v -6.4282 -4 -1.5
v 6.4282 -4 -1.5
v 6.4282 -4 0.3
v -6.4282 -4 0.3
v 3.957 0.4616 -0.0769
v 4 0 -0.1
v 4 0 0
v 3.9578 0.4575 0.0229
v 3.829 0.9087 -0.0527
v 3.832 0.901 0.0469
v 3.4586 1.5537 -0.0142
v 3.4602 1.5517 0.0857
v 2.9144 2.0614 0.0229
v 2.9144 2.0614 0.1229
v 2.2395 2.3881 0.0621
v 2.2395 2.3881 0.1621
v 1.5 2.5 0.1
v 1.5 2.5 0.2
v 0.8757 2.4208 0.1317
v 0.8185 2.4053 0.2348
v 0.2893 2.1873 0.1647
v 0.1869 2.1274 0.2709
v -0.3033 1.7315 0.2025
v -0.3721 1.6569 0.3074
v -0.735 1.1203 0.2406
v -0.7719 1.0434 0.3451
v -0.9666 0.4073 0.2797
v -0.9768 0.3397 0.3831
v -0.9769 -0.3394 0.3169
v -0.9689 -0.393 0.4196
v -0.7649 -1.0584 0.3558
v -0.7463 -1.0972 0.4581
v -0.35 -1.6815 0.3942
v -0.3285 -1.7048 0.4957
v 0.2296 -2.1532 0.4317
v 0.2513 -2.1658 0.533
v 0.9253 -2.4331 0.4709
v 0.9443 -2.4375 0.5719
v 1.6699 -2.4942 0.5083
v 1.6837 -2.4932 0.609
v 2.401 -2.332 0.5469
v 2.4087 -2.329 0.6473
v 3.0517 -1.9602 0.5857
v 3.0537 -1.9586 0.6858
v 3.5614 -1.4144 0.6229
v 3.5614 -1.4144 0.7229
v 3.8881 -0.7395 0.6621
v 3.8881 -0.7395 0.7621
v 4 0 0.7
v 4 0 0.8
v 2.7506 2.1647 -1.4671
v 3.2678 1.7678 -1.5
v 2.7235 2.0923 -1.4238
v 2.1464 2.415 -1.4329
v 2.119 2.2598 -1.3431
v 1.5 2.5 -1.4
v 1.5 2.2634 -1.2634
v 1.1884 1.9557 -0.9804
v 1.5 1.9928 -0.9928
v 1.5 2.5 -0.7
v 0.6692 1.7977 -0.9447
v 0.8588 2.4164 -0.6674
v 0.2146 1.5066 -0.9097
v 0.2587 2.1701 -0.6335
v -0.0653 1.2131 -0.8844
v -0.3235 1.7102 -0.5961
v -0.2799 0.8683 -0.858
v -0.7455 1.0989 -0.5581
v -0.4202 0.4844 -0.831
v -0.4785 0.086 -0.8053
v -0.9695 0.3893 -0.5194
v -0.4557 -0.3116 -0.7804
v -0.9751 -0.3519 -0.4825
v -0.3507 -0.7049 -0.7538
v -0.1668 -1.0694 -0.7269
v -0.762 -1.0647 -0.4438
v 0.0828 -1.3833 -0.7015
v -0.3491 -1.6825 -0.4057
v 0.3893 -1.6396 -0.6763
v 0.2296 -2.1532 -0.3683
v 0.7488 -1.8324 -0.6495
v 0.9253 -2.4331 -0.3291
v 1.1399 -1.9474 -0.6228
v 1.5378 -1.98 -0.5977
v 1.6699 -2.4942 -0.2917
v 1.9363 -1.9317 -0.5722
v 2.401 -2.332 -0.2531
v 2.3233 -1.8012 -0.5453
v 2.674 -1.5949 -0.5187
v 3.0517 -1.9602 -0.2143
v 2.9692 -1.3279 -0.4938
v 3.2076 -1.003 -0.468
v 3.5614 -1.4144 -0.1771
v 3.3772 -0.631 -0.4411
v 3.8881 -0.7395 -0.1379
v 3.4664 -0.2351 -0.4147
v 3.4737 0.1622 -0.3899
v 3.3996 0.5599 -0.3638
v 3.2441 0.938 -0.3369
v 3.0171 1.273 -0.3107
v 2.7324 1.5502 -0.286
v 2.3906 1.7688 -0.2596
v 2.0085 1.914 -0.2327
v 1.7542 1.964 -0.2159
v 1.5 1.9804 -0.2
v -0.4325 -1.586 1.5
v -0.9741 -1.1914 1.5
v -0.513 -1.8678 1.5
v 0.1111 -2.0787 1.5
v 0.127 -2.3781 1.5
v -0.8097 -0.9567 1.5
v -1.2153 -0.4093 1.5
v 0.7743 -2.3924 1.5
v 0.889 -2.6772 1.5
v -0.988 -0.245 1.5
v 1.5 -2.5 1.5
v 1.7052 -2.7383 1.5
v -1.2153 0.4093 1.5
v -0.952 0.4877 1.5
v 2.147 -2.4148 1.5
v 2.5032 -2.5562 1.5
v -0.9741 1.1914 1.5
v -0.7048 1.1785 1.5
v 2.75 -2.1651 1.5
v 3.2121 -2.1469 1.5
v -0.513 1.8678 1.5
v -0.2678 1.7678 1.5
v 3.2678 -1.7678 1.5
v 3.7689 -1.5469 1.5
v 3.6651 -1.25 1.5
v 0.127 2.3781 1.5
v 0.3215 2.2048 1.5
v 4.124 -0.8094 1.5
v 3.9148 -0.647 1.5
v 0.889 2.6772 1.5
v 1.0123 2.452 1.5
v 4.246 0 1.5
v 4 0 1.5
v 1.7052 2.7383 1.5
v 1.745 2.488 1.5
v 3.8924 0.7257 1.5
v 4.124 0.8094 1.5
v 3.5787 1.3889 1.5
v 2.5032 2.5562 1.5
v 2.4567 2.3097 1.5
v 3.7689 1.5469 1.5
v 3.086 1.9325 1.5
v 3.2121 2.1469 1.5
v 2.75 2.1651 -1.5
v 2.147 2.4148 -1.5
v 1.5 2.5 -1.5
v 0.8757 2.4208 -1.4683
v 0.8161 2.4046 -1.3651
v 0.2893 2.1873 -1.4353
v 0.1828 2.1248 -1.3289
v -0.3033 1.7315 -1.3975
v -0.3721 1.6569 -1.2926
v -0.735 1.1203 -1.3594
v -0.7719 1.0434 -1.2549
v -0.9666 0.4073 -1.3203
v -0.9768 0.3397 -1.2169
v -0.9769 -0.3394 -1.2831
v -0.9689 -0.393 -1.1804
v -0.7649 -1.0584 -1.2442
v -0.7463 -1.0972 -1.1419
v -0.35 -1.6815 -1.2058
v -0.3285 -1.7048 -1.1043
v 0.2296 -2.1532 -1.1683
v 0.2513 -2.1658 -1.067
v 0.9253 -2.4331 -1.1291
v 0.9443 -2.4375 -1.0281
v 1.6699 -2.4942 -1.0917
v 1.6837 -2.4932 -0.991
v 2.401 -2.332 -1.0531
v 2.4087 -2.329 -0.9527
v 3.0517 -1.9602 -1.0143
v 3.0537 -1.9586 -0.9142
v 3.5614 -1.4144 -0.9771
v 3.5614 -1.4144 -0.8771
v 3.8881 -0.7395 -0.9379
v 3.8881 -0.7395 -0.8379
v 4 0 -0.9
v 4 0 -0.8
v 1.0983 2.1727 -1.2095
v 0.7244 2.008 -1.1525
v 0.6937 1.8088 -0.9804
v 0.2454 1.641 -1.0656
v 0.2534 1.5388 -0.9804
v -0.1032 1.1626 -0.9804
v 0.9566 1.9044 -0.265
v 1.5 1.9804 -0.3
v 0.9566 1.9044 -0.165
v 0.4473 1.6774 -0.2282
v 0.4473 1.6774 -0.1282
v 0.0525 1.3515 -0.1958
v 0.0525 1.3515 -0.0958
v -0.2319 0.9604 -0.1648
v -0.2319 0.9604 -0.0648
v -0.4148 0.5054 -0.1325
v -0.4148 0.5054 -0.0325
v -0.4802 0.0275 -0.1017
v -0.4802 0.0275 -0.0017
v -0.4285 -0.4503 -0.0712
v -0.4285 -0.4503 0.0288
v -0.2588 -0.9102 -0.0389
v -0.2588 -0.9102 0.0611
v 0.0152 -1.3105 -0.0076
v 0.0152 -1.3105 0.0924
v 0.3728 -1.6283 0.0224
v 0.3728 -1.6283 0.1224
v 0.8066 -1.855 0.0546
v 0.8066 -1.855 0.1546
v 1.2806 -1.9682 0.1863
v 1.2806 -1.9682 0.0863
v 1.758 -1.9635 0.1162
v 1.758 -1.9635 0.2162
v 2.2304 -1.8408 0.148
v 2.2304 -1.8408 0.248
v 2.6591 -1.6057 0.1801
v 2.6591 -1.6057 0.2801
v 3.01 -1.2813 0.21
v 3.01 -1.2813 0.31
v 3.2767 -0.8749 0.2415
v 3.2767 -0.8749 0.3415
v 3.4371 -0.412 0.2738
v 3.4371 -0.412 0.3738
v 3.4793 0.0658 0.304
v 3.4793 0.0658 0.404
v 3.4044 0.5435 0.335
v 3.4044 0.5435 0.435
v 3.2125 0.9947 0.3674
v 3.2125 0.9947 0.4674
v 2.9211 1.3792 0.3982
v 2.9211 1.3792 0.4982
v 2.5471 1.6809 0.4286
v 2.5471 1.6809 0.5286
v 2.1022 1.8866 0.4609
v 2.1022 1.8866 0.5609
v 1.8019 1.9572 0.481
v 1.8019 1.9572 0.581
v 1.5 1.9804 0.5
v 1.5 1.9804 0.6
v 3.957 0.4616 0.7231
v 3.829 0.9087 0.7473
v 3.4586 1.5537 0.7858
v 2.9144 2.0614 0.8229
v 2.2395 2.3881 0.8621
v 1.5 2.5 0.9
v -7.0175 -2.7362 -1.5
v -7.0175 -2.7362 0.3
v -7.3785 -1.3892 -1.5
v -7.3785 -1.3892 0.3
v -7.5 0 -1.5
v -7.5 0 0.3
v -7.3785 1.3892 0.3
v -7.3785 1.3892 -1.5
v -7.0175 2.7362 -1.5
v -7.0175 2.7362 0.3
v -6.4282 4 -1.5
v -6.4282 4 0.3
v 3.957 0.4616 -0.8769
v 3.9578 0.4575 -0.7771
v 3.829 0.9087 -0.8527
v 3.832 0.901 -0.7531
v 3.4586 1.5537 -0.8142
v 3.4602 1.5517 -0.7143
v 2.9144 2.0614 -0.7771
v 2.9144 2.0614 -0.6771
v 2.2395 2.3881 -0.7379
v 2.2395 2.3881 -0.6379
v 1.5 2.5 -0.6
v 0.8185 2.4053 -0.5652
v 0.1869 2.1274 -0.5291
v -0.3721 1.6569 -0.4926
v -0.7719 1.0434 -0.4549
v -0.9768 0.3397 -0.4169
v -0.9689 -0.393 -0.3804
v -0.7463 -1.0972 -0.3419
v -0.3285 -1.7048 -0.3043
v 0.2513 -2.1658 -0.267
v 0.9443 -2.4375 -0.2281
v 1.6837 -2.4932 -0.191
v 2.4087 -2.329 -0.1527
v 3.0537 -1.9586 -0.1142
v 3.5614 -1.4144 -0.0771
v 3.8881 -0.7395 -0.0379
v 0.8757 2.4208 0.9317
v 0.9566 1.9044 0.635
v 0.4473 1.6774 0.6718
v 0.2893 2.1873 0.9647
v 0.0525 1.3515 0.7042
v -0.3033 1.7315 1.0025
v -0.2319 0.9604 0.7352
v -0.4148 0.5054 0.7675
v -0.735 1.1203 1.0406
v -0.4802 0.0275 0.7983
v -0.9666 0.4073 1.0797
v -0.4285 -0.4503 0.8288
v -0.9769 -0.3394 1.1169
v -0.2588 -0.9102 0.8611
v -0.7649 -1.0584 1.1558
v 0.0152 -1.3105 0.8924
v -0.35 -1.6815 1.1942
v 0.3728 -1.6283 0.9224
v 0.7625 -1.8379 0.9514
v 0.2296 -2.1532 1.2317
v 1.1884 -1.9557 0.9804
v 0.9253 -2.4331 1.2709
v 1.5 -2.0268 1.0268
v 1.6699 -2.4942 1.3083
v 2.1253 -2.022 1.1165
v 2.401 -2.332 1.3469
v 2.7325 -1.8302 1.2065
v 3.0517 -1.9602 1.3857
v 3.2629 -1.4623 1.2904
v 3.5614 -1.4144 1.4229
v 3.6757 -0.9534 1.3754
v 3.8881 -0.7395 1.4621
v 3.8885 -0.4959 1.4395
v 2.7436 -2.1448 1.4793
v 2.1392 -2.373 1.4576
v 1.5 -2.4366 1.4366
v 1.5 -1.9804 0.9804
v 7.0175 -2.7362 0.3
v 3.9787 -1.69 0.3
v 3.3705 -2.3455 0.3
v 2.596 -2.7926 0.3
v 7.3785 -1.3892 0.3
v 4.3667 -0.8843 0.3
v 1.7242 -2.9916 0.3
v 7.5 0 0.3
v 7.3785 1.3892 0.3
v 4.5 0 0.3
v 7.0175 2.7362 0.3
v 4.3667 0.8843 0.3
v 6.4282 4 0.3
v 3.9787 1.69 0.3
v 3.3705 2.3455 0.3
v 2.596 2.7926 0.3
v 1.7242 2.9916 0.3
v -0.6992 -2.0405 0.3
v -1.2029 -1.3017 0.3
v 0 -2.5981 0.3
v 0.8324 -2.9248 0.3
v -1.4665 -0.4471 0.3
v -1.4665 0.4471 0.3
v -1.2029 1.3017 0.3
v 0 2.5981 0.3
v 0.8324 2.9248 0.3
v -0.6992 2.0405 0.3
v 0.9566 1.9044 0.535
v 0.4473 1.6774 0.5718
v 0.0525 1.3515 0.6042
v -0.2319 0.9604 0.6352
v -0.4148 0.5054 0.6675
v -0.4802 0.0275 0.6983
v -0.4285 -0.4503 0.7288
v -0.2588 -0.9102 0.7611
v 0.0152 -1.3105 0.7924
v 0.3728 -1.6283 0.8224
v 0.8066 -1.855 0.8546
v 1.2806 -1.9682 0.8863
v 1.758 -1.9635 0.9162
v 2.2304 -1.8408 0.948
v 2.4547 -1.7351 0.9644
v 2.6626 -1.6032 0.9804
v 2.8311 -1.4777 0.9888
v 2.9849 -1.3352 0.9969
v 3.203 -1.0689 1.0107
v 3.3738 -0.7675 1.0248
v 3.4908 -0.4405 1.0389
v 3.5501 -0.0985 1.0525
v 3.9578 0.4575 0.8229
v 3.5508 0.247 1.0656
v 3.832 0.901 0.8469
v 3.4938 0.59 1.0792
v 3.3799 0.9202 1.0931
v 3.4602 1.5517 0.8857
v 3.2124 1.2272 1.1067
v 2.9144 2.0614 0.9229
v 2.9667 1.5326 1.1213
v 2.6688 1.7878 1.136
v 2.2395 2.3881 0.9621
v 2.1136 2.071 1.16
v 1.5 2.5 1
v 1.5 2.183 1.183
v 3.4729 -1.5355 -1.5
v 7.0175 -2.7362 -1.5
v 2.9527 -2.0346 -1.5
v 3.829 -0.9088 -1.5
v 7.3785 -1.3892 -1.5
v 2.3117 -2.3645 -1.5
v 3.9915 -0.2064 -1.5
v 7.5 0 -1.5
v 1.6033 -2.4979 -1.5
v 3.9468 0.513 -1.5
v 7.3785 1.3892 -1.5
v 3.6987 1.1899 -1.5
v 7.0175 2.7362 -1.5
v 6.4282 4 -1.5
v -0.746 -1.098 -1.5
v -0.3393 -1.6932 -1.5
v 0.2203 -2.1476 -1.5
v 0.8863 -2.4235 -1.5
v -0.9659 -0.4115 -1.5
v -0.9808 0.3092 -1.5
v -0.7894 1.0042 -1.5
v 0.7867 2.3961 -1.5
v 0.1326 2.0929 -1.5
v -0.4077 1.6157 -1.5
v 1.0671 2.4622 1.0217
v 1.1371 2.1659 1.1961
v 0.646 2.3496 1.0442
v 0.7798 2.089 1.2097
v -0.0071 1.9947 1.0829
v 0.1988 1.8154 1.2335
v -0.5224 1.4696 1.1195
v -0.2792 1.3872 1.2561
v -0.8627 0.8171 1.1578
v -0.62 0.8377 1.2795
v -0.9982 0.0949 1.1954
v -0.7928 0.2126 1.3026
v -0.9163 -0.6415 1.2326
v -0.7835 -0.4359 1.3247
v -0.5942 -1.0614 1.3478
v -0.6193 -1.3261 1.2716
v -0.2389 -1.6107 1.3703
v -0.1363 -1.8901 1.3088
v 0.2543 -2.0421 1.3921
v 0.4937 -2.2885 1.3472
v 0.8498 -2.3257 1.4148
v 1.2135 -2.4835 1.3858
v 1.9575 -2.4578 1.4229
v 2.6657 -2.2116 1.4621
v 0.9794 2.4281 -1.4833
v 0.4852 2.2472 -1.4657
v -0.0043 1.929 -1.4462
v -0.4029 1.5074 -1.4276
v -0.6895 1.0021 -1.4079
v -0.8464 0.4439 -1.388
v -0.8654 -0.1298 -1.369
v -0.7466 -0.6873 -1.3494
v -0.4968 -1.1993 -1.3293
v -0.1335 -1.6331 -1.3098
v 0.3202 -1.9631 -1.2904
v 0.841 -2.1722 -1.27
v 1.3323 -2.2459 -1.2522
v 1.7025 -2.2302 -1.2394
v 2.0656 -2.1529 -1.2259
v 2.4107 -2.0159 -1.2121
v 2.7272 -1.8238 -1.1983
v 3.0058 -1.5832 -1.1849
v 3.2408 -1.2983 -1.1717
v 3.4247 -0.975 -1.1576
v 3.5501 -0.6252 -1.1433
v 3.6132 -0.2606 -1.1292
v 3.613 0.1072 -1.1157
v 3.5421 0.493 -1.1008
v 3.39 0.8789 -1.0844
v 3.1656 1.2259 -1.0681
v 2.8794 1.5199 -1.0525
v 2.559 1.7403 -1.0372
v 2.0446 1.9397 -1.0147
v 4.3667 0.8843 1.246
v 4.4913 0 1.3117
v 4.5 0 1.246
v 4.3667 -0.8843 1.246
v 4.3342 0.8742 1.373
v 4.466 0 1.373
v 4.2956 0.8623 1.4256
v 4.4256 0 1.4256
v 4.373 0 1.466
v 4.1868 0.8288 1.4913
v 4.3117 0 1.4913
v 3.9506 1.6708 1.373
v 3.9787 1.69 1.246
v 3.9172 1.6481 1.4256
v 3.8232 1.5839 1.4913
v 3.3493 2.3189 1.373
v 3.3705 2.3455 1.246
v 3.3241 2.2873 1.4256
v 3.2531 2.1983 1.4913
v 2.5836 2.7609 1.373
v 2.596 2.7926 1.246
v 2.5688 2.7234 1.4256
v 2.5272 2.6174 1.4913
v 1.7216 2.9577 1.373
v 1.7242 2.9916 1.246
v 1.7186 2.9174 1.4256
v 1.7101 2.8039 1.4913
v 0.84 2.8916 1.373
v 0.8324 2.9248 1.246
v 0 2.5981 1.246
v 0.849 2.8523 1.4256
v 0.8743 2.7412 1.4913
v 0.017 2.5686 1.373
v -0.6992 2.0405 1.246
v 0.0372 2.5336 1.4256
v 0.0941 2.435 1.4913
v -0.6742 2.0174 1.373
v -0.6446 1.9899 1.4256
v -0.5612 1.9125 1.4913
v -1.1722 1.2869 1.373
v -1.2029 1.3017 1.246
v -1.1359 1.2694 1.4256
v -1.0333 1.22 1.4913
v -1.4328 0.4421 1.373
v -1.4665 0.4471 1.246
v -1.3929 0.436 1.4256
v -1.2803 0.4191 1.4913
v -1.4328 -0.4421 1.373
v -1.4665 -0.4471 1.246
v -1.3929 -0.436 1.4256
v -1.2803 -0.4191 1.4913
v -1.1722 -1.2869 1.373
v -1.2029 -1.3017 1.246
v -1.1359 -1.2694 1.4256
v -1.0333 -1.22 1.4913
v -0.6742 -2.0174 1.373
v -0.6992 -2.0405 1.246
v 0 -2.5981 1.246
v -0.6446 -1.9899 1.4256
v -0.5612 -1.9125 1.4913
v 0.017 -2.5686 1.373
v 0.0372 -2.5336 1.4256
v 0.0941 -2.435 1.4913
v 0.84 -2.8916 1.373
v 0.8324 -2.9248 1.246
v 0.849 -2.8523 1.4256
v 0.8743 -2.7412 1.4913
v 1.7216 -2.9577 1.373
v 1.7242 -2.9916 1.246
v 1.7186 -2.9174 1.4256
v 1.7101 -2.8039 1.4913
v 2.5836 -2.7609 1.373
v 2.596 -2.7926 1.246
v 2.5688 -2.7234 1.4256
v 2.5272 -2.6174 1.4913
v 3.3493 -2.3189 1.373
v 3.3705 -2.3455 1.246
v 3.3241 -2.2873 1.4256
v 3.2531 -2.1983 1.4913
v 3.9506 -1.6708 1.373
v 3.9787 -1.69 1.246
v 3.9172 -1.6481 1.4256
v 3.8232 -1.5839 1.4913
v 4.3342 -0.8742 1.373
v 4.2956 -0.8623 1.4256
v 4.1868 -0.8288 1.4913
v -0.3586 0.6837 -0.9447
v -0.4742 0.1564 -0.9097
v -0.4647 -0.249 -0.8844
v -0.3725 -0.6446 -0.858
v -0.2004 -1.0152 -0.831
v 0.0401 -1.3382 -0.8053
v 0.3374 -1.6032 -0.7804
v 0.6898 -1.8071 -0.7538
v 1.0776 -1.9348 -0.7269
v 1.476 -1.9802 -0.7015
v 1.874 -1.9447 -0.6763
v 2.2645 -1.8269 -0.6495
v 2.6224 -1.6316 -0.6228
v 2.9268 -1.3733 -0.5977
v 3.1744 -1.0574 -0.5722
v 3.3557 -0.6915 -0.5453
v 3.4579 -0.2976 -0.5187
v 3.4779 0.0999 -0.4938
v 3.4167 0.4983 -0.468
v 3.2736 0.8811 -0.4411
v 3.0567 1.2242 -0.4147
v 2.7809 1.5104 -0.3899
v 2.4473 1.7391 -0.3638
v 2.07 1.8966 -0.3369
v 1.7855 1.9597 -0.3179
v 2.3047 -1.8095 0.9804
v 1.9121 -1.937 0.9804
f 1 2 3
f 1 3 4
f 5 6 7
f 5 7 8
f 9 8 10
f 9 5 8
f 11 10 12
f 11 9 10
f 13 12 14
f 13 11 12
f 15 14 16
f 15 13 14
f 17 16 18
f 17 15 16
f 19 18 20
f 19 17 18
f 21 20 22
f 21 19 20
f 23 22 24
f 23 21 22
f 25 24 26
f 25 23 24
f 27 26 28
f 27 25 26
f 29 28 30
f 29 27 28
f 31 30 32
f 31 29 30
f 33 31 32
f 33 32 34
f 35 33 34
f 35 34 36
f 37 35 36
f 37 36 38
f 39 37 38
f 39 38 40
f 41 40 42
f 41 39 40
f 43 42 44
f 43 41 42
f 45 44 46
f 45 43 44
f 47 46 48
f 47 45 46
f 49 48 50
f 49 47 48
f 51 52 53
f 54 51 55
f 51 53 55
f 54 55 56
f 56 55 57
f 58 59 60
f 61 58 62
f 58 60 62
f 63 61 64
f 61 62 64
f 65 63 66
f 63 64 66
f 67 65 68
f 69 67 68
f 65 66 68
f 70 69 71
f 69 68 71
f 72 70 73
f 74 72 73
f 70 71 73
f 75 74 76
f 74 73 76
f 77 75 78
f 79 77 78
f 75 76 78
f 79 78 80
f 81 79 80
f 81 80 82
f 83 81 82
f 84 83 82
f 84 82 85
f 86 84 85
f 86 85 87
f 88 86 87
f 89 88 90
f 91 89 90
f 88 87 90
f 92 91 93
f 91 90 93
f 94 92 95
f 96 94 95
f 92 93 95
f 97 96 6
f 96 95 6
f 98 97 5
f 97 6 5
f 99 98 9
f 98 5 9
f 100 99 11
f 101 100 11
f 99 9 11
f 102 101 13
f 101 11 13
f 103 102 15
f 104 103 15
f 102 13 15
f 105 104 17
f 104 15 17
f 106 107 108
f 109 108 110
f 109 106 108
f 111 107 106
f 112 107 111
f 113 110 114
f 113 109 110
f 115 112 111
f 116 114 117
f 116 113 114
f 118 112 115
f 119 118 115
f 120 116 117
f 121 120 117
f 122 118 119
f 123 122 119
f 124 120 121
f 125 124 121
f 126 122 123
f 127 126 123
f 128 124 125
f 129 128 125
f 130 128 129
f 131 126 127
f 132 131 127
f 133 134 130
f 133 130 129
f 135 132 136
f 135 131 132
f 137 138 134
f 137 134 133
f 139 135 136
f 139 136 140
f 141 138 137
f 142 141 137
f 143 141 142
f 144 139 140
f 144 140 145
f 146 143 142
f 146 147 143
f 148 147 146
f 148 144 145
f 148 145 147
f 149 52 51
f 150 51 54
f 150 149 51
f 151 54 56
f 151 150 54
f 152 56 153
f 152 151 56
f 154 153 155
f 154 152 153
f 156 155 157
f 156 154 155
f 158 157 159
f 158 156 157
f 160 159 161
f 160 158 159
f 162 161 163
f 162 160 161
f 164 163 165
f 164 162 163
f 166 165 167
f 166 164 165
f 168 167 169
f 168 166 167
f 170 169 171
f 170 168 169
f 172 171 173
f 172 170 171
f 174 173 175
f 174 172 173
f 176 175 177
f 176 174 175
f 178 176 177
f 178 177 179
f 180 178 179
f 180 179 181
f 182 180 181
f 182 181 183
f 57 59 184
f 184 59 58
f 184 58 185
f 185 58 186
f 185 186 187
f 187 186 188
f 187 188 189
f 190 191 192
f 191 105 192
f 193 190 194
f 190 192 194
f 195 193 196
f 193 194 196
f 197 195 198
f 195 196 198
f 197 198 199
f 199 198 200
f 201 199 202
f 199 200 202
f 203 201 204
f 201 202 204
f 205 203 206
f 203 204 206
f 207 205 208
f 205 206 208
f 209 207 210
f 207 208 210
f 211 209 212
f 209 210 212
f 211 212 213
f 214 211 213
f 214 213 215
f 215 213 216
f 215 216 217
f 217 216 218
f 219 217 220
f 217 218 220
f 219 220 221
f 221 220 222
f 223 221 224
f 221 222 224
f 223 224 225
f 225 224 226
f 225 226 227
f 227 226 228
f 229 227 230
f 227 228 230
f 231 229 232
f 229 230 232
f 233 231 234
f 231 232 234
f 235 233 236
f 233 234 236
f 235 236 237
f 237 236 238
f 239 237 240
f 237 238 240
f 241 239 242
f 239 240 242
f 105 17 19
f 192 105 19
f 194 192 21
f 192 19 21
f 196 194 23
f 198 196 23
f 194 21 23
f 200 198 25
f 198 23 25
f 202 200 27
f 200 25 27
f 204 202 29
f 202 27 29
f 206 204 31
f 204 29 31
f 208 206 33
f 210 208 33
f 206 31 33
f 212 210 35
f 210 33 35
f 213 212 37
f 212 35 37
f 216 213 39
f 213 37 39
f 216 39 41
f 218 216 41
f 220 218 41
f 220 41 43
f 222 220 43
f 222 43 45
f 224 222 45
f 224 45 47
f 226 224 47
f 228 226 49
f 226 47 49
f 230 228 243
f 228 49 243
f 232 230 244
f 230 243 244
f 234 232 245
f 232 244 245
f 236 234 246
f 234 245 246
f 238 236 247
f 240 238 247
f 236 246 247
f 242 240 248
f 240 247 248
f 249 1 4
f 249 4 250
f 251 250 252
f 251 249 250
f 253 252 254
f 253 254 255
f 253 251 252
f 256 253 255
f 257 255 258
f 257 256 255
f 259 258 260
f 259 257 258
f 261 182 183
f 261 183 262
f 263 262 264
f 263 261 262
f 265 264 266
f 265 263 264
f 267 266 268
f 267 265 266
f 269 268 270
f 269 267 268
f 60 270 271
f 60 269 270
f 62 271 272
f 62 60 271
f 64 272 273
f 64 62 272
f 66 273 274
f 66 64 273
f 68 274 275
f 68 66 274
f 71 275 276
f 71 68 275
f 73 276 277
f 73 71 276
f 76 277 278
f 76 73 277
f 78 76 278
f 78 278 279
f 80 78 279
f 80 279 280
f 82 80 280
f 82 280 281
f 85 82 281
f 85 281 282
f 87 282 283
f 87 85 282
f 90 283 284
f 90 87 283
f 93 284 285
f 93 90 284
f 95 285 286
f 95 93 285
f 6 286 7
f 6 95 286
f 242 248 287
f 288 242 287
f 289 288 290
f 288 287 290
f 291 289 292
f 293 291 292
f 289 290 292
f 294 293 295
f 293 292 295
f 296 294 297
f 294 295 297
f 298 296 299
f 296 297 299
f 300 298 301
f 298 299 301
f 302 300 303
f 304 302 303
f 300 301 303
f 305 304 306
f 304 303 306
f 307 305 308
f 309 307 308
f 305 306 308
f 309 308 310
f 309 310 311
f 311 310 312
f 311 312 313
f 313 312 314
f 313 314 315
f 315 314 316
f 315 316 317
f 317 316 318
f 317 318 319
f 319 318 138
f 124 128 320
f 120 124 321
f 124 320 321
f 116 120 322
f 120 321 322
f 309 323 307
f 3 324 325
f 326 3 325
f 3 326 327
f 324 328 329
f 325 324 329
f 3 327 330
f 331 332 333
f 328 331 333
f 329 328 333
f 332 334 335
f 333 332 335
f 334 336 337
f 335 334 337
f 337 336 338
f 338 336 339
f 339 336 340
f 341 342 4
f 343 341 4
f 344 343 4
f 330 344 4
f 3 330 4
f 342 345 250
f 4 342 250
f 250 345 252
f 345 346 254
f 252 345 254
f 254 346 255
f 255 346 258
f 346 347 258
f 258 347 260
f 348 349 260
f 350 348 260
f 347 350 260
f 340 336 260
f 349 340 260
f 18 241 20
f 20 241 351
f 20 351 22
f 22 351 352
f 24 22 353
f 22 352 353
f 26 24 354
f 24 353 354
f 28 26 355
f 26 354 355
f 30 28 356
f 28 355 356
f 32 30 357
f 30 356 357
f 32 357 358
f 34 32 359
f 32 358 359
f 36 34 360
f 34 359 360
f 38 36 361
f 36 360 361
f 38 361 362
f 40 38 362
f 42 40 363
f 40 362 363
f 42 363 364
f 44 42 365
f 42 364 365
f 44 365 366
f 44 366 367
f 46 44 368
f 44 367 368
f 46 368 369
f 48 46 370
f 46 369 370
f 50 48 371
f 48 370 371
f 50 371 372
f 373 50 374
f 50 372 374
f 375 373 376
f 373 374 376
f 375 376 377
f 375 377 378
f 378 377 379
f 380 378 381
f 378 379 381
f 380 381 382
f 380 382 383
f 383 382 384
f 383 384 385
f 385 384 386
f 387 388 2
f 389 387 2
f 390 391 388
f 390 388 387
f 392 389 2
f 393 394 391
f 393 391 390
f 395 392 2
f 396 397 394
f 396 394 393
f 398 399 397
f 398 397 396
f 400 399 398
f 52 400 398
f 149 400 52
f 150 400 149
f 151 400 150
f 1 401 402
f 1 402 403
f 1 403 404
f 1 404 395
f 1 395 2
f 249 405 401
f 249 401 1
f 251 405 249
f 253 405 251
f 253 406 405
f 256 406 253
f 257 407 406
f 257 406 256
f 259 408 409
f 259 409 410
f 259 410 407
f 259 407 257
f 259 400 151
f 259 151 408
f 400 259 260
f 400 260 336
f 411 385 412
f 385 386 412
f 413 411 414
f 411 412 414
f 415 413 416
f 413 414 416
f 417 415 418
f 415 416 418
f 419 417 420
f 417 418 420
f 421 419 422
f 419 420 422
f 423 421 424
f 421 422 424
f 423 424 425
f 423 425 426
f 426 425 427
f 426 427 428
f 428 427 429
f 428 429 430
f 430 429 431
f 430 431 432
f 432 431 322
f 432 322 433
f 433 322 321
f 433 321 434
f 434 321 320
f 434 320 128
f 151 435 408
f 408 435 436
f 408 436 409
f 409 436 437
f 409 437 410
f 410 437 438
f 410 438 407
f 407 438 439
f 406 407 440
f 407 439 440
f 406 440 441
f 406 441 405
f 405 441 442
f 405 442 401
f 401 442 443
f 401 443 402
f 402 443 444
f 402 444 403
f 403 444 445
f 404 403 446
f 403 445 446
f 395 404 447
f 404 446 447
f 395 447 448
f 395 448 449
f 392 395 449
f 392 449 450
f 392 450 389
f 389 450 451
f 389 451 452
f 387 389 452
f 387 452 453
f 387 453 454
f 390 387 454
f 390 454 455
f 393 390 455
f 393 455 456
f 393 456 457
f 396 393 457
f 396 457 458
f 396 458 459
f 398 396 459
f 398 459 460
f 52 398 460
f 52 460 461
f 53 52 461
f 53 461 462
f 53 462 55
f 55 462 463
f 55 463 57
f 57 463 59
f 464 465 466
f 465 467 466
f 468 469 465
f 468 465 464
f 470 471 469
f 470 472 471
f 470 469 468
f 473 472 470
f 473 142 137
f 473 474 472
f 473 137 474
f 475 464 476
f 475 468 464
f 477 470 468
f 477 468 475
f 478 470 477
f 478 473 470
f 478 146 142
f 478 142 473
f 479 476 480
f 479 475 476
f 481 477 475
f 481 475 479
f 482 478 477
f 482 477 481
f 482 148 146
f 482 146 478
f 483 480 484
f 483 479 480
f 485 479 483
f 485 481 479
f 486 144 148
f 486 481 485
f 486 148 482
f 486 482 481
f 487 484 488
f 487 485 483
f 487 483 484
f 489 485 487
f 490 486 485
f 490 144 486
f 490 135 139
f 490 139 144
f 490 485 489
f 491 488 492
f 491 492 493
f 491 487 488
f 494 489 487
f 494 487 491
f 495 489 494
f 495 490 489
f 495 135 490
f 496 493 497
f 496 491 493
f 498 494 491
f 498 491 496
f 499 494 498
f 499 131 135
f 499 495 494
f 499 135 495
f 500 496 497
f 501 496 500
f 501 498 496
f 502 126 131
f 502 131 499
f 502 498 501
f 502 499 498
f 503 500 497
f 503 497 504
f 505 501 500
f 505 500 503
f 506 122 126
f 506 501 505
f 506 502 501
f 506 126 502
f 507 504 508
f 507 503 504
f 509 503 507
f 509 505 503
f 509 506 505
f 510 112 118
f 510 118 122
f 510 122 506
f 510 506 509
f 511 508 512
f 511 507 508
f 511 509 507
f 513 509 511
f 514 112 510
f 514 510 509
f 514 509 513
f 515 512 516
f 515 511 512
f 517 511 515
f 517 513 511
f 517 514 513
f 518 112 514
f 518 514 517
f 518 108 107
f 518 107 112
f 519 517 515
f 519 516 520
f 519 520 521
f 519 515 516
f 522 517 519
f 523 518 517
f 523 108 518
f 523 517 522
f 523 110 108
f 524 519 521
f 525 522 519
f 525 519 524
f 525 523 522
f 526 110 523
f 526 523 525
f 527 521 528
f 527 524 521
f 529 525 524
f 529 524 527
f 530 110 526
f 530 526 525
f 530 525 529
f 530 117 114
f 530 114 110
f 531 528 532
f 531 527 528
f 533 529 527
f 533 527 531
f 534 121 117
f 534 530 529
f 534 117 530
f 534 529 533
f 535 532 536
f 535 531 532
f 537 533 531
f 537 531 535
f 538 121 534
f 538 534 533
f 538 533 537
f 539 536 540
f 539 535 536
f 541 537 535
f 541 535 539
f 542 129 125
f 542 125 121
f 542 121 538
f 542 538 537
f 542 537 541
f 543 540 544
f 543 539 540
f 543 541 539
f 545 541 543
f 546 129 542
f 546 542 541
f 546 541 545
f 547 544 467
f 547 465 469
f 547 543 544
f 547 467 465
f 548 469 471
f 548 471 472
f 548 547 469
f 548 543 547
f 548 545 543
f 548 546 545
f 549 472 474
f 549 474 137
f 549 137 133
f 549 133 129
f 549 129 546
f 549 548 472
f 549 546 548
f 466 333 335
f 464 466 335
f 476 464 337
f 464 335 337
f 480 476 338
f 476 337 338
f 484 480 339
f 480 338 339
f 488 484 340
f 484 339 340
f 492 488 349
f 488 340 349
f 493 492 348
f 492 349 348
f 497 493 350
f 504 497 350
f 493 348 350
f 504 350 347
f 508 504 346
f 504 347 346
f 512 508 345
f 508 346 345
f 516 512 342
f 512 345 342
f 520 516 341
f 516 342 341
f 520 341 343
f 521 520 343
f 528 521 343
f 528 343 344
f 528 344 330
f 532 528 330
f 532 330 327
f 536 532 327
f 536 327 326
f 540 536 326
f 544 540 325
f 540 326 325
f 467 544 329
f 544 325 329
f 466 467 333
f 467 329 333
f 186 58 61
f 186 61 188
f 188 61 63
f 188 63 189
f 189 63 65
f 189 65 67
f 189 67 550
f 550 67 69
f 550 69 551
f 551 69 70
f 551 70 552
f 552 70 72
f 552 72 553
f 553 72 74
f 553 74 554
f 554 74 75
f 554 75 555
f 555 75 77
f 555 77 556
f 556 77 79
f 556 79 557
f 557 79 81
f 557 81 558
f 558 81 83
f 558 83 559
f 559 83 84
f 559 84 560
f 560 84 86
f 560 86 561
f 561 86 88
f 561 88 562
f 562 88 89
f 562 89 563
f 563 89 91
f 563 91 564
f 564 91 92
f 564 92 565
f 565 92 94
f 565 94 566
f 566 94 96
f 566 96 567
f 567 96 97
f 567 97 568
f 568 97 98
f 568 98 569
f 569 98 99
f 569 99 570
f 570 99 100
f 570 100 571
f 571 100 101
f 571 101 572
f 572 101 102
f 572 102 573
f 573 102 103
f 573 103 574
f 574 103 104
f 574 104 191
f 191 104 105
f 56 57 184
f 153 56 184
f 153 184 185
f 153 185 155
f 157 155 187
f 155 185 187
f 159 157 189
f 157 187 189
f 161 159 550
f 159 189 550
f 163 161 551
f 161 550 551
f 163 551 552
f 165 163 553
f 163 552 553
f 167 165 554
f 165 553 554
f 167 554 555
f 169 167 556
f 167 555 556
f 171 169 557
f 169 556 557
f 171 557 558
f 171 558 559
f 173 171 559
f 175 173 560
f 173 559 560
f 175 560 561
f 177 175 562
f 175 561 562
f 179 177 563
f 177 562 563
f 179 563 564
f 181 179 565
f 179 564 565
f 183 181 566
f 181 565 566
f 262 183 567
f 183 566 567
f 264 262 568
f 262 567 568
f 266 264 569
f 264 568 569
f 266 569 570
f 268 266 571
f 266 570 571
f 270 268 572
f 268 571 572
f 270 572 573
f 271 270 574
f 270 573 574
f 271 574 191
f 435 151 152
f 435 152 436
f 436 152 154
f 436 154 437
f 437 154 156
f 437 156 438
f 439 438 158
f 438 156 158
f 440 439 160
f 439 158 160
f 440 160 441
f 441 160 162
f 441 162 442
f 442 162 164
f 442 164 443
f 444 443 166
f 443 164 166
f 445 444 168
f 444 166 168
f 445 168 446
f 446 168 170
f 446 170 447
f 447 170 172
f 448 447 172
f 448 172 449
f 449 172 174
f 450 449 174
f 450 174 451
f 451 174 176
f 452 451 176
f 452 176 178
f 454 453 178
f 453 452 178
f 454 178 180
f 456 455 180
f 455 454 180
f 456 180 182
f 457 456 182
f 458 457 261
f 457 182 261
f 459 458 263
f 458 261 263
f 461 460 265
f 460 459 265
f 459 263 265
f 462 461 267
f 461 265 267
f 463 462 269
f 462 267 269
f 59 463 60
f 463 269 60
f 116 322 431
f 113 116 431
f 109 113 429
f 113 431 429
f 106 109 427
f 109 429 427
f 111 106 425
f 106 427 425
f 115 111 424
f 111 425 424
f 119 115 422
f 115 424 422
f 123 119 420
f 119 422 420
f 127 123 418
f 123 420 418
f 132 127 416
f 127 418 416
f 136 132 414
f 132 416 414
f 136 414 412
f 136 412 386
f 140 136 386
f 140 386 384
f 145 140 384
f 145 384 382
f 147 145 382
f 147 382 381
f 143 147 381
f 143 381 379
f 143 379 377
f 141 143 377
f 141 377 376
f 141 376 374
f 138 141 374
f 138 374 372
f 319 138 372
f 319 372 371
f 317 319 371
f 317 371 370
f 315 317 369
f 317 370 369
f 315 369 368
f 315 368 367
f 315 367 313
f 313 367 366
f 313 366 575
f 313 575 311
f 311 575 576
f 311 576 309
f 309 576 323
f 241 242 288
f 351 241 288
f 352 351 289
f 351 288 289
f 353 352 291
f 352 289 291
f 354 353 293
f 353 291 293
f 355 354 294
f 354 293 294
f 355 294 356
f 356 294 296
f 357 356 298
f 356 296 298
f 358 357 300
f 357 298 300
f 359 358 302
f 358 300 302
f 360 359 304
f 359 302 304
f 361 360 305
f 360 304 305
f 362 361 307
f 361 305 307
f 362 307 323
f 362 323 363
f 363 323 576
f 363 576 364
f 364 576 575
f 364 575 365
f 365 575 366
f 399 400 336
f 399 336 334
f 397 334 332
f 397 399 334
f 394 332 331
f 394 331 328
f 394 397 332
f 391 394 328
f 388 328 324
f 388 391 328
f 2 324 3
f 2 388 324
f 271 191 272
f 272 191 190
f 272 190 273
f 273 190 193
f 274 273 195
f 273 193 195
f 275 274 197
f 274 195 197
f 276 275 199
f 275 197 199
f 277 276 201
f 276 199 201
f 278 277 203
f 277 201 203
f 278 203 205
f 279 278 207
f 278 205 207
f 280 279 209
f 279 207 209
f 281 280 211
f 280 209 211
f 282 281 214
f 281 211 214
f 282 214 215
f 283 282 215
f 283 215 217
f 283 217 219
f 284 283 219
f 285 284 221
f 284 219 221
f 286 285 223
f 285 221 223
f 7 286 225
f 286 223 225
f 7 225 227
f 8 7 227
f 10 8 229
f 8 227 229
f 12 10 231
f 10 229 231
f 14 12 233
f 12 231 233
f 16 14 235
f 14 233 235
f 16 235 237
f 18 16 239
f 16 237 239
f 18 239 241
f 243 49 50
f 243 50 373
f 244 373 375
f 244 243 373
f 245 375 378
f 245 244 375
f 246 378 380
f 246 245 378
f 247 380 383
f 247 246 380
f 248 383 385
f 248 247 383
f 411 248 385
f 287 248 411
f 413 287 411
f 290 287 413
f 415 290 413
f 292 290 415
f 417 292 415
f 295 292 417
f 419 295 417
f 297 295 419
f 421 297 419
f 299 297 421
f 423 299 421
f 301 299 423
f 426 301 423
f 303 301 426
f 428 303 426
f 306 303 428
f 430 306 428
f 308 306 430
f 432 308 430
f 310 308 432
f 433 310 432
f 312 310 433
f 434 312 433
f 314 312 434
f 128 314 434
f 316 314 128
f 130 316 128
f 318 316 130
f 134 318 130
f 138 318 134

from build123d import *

# Parameters (mm, degrees)
BOSS_EXTRUDE1_START     = -1.5
BOSS_EXTRUDE1_DEPTH     = 1.8
SKETCH8_R               = 3
SKETCH8_R_2             = 2.5
BOSS_EXTRUDE2_DEPTH     = 1.2
CUT_EXTRUDE1_DEPTH      = 9.631338251
CUT_EXTRUDE1_DEPTH_BACK = 9.631338251
SKETCH9_R               = 2.5
FILLET1_R               = 0.254
SWEEP1_PITCH            = 0.8
SPLIT1_START            = -2.7460001
SPLIT1_OUTLINE_W        = 9
SPLIT1_OUTLINE_H        = 2.5
SPLIT1_DEPTH            = 5.4920002


with BuildPart() as part:
    # Sketch7 → Boss-Extrude1 (new body)
    with BuildSketch(Plane.XY.offset(BOSS_EXTRUDE1_START)):
        with BuildLine():
            Line((-6.42820323, 4), (6.42820323, 4))
            ThreePointArc((6.42820323, 4), (7.5, 0), (6.42820323, -4))
            Line((6.42820323, -4), (-6.42820323, -4))
            ThreePointArc((-6.42820323, -4), (-7.5, 0), (-6.42820323, 4))
        make_face()
    extrude(amount=BOSS_EXTRUDE1_DEPTH)

    # Sketch8 → Boss-Extrude2 (add)
    with BuildSketch(Plane.XY.offset(0.3)):
        with Locations((1.5, 0)):
            Circle(SKETCH8_R)
        with Locations((1.5, 0)):
            Circle(SKETCH8_R_2, mode=Mode.SUBTRACT)
    extrude(amount=BOSS_EXTRUDE2_DEPTH)

    # Sketch9 → Cut-Extrude1 (cut, two sides: drawn at the far end of the back side and taken through both)
    with BuildSketch(Plane.XY.offset(-CUT_EXTRUDE1_DEPTH_BACK)):
        with Locations((1.5, 0)):
            Circle(SKETCH9_R)
    extrude(amount=CUT_EXTRUDE1_DEPTH + CUT_EXTRUDE1_DEPTH_BACK, mode=Mode.SUBTRACT)

    # Fillet1
    fillet1_edges = [part.edges().sort_by_distance(p)[0] for p in [
        (-1.5, 0, 1.5),
    ]]
    fillet(fillet1_edges, radius=FILLET1_R)

    # Sweep1: arcs per turn and ends read off the stored shape
    # Sweep1: the profile of Sketch3 screwed along a right-hand helix through 4.75 turns, 8 arcs to a turn; built about Z, then put on its axis
    sweep1_z = Axis((0, 0, 0), (0, 0, 1))
    sweep1_corners = [(2.54330127, 0, 0.025), (2.54330127, 0, -0.725), (1.980384758, 0, -0.4), (1.980384758, 0, -0.3)]
    with BuildLine(mode=Mode.PRIVATE) as sweep1_profile:
        Line(sweep1_corners[0], sweep1_corners[1])
        Line(sweep1_corners[1], sweep1_corners[2])
        Line(sweep1_corners[2], sweep1_corners[3])
        Line(sweep1_corners[3], sweep1_corners[0])
    sweep1_cap = Face(sweep1_profile.wire())
    sweep1_turn_angles = [0, 22.5, 45, 67.5, 90, 112.5, 135, 157.5, 180, 202.5, 225, 247.5, 270, 292.5, 315, 337.5, 360]
    sweep1_turn_weights = [1, 0.9238795325112867, 1, 0.9238795325112867, 1, 0.9238795325112867, 1, 0.9238795325112867, 1, 0.9238795325112867, 1, 0.9238795325112867, 1, 0.9238795325112867, 1, 0.9238795325112867, 1]
    sweep1_turn_rails = [Edge.make_bspline([Vector(p[0], p[1], 0).rotate(sweep1_z, sweep1_turn_angles[k]) / sweep1_turn_weights[k] + Vector(0, 0, p[2] + SWEEP1_PITCH * sweep1_turn_angles[k] / 360) for k in range(17)], [0, 0, 0, 1, 1, 2, 2, 3, 3, 4, 4, 5, 5, 6, 6, 7, 7, 8, 8, 8], 2, sweep1_turn_weights) for p in sweep1_corners]
    sweep1_turn_sides = [Face.make_surface_from_curves(sweep1_turn_rails[p[0]], sweep1_turn_rails[p[1]]) for p in [(0, 1), (1, 2), (2, 3), (3, 0)]]
    sweep1_last_angles = [1440, 1462.5, 1485, 1507.5, 1530, 1552.5, 1575, 1597.5, 1620, 1642.5, 1665, 1687.5, 1710]
    sweep1_last_weights = [1, 0.9238795325112867, 1, 0.9238795325112867, 1, 0.9238795325112867, 1, 0.9238795325112867, 1, 0.9238795325112867, 1, 0.9238795325112776, 1]
    sweep1_last_rails = [Edge.make_bspline([Vector(p[0], p[1], 0).rotate(sweep1_z, sweep1_last_angles[k]) / sweep1_last_weights[k] + Vector(0, 0, p[2] + SWEEP1_PITCH * sweep1_last_angles[k] / 360) for k in range(13)], [0, 0, 0, 1, 1, 2, 2, 3, 3, 4, 4, 5, 5, 6, 6, 6], 2, sweep1_last_weights) for p in sweep1_corners]
    sweep1_last_sides = [Face.make_surface_from_curves(sweep1_last_rails[p[0]], sweep1_last_rails[p[1]]) for p in [(0, 1), (1, 2), (2, 3), (3, 0)]]
    sweep1 = Plane(origin=(1.5, 0, -1.5), x_dir=(0, 1, 0), z_dir=(0, 0, 1)) * Solid(Shell([*[p.moved(Location((0, 0, SWEEP1_PITCH * i))) for i in range(4) for p in sweep1_turn_sides], *sweep1_last_sides, sweep1_cap, sweep1_cap.rotate(sweep1_z, 1710).moved(Location((0, 0, SWEEP1_PITCH * 1710 / 360)))]))
    add(sweep1)

    # Split1: read off the stored shape, not the designer's step
    # Split1 outline → Split1 (cut)
    with BuildSketch(Plane(origin=(0, 0, 0), x_dir=(1, 0, 0), z_dir=(0, 1, 0)).offset(SPLIT1_START)):
        with Locations((1.5, -2.75)):
            Rectangle(SPLIT1_OUTLINE_W, SPLIT1_OUTLINE_H)
        with Locations((1.5, 2.75)):
            Rectangle(SPLIT1_OUTLINE_W, SPLIT1_OUTLINE_H)
    extrude(amount=SPLIT1_DEPTH, mode=Mode.SUBTRACT)

    # Cut-Extrude2 cone 1 section (through the dimple's axis) → Cut-Extrude2 (revolve, cut)
    with BuildSketch(Plane(origin=(1.5, 0, -1.5), x_dir=(0, 1, 0), z_dir=(1, 0, 0))):
        Polygon((0, 0), (2.5, 0), (0, 2.5), align=None)
    revolve(axis=Axis((1.5, 0, -1.5), (0, 0, 1)), mode=Mode.SUBTRACT)

    # Cut-Extrude3 cone 1 section (through the dimple's axis) → Cut-Extrude3 (revolve, cut)
    with BuildSketch(Plane(origin=(1.5, 0, 1.5), x_dir=(0, -1, 0), z_dir=(1, 0, 0))):
        Polygon((0, 0), (2.5, 0), (0, 2.5), align=None)
    revolve(axis=Axis((1.5, 0, 1.5), (0, 0, -1)), mode=Mode.SUBTRACT)


solid = part.part
